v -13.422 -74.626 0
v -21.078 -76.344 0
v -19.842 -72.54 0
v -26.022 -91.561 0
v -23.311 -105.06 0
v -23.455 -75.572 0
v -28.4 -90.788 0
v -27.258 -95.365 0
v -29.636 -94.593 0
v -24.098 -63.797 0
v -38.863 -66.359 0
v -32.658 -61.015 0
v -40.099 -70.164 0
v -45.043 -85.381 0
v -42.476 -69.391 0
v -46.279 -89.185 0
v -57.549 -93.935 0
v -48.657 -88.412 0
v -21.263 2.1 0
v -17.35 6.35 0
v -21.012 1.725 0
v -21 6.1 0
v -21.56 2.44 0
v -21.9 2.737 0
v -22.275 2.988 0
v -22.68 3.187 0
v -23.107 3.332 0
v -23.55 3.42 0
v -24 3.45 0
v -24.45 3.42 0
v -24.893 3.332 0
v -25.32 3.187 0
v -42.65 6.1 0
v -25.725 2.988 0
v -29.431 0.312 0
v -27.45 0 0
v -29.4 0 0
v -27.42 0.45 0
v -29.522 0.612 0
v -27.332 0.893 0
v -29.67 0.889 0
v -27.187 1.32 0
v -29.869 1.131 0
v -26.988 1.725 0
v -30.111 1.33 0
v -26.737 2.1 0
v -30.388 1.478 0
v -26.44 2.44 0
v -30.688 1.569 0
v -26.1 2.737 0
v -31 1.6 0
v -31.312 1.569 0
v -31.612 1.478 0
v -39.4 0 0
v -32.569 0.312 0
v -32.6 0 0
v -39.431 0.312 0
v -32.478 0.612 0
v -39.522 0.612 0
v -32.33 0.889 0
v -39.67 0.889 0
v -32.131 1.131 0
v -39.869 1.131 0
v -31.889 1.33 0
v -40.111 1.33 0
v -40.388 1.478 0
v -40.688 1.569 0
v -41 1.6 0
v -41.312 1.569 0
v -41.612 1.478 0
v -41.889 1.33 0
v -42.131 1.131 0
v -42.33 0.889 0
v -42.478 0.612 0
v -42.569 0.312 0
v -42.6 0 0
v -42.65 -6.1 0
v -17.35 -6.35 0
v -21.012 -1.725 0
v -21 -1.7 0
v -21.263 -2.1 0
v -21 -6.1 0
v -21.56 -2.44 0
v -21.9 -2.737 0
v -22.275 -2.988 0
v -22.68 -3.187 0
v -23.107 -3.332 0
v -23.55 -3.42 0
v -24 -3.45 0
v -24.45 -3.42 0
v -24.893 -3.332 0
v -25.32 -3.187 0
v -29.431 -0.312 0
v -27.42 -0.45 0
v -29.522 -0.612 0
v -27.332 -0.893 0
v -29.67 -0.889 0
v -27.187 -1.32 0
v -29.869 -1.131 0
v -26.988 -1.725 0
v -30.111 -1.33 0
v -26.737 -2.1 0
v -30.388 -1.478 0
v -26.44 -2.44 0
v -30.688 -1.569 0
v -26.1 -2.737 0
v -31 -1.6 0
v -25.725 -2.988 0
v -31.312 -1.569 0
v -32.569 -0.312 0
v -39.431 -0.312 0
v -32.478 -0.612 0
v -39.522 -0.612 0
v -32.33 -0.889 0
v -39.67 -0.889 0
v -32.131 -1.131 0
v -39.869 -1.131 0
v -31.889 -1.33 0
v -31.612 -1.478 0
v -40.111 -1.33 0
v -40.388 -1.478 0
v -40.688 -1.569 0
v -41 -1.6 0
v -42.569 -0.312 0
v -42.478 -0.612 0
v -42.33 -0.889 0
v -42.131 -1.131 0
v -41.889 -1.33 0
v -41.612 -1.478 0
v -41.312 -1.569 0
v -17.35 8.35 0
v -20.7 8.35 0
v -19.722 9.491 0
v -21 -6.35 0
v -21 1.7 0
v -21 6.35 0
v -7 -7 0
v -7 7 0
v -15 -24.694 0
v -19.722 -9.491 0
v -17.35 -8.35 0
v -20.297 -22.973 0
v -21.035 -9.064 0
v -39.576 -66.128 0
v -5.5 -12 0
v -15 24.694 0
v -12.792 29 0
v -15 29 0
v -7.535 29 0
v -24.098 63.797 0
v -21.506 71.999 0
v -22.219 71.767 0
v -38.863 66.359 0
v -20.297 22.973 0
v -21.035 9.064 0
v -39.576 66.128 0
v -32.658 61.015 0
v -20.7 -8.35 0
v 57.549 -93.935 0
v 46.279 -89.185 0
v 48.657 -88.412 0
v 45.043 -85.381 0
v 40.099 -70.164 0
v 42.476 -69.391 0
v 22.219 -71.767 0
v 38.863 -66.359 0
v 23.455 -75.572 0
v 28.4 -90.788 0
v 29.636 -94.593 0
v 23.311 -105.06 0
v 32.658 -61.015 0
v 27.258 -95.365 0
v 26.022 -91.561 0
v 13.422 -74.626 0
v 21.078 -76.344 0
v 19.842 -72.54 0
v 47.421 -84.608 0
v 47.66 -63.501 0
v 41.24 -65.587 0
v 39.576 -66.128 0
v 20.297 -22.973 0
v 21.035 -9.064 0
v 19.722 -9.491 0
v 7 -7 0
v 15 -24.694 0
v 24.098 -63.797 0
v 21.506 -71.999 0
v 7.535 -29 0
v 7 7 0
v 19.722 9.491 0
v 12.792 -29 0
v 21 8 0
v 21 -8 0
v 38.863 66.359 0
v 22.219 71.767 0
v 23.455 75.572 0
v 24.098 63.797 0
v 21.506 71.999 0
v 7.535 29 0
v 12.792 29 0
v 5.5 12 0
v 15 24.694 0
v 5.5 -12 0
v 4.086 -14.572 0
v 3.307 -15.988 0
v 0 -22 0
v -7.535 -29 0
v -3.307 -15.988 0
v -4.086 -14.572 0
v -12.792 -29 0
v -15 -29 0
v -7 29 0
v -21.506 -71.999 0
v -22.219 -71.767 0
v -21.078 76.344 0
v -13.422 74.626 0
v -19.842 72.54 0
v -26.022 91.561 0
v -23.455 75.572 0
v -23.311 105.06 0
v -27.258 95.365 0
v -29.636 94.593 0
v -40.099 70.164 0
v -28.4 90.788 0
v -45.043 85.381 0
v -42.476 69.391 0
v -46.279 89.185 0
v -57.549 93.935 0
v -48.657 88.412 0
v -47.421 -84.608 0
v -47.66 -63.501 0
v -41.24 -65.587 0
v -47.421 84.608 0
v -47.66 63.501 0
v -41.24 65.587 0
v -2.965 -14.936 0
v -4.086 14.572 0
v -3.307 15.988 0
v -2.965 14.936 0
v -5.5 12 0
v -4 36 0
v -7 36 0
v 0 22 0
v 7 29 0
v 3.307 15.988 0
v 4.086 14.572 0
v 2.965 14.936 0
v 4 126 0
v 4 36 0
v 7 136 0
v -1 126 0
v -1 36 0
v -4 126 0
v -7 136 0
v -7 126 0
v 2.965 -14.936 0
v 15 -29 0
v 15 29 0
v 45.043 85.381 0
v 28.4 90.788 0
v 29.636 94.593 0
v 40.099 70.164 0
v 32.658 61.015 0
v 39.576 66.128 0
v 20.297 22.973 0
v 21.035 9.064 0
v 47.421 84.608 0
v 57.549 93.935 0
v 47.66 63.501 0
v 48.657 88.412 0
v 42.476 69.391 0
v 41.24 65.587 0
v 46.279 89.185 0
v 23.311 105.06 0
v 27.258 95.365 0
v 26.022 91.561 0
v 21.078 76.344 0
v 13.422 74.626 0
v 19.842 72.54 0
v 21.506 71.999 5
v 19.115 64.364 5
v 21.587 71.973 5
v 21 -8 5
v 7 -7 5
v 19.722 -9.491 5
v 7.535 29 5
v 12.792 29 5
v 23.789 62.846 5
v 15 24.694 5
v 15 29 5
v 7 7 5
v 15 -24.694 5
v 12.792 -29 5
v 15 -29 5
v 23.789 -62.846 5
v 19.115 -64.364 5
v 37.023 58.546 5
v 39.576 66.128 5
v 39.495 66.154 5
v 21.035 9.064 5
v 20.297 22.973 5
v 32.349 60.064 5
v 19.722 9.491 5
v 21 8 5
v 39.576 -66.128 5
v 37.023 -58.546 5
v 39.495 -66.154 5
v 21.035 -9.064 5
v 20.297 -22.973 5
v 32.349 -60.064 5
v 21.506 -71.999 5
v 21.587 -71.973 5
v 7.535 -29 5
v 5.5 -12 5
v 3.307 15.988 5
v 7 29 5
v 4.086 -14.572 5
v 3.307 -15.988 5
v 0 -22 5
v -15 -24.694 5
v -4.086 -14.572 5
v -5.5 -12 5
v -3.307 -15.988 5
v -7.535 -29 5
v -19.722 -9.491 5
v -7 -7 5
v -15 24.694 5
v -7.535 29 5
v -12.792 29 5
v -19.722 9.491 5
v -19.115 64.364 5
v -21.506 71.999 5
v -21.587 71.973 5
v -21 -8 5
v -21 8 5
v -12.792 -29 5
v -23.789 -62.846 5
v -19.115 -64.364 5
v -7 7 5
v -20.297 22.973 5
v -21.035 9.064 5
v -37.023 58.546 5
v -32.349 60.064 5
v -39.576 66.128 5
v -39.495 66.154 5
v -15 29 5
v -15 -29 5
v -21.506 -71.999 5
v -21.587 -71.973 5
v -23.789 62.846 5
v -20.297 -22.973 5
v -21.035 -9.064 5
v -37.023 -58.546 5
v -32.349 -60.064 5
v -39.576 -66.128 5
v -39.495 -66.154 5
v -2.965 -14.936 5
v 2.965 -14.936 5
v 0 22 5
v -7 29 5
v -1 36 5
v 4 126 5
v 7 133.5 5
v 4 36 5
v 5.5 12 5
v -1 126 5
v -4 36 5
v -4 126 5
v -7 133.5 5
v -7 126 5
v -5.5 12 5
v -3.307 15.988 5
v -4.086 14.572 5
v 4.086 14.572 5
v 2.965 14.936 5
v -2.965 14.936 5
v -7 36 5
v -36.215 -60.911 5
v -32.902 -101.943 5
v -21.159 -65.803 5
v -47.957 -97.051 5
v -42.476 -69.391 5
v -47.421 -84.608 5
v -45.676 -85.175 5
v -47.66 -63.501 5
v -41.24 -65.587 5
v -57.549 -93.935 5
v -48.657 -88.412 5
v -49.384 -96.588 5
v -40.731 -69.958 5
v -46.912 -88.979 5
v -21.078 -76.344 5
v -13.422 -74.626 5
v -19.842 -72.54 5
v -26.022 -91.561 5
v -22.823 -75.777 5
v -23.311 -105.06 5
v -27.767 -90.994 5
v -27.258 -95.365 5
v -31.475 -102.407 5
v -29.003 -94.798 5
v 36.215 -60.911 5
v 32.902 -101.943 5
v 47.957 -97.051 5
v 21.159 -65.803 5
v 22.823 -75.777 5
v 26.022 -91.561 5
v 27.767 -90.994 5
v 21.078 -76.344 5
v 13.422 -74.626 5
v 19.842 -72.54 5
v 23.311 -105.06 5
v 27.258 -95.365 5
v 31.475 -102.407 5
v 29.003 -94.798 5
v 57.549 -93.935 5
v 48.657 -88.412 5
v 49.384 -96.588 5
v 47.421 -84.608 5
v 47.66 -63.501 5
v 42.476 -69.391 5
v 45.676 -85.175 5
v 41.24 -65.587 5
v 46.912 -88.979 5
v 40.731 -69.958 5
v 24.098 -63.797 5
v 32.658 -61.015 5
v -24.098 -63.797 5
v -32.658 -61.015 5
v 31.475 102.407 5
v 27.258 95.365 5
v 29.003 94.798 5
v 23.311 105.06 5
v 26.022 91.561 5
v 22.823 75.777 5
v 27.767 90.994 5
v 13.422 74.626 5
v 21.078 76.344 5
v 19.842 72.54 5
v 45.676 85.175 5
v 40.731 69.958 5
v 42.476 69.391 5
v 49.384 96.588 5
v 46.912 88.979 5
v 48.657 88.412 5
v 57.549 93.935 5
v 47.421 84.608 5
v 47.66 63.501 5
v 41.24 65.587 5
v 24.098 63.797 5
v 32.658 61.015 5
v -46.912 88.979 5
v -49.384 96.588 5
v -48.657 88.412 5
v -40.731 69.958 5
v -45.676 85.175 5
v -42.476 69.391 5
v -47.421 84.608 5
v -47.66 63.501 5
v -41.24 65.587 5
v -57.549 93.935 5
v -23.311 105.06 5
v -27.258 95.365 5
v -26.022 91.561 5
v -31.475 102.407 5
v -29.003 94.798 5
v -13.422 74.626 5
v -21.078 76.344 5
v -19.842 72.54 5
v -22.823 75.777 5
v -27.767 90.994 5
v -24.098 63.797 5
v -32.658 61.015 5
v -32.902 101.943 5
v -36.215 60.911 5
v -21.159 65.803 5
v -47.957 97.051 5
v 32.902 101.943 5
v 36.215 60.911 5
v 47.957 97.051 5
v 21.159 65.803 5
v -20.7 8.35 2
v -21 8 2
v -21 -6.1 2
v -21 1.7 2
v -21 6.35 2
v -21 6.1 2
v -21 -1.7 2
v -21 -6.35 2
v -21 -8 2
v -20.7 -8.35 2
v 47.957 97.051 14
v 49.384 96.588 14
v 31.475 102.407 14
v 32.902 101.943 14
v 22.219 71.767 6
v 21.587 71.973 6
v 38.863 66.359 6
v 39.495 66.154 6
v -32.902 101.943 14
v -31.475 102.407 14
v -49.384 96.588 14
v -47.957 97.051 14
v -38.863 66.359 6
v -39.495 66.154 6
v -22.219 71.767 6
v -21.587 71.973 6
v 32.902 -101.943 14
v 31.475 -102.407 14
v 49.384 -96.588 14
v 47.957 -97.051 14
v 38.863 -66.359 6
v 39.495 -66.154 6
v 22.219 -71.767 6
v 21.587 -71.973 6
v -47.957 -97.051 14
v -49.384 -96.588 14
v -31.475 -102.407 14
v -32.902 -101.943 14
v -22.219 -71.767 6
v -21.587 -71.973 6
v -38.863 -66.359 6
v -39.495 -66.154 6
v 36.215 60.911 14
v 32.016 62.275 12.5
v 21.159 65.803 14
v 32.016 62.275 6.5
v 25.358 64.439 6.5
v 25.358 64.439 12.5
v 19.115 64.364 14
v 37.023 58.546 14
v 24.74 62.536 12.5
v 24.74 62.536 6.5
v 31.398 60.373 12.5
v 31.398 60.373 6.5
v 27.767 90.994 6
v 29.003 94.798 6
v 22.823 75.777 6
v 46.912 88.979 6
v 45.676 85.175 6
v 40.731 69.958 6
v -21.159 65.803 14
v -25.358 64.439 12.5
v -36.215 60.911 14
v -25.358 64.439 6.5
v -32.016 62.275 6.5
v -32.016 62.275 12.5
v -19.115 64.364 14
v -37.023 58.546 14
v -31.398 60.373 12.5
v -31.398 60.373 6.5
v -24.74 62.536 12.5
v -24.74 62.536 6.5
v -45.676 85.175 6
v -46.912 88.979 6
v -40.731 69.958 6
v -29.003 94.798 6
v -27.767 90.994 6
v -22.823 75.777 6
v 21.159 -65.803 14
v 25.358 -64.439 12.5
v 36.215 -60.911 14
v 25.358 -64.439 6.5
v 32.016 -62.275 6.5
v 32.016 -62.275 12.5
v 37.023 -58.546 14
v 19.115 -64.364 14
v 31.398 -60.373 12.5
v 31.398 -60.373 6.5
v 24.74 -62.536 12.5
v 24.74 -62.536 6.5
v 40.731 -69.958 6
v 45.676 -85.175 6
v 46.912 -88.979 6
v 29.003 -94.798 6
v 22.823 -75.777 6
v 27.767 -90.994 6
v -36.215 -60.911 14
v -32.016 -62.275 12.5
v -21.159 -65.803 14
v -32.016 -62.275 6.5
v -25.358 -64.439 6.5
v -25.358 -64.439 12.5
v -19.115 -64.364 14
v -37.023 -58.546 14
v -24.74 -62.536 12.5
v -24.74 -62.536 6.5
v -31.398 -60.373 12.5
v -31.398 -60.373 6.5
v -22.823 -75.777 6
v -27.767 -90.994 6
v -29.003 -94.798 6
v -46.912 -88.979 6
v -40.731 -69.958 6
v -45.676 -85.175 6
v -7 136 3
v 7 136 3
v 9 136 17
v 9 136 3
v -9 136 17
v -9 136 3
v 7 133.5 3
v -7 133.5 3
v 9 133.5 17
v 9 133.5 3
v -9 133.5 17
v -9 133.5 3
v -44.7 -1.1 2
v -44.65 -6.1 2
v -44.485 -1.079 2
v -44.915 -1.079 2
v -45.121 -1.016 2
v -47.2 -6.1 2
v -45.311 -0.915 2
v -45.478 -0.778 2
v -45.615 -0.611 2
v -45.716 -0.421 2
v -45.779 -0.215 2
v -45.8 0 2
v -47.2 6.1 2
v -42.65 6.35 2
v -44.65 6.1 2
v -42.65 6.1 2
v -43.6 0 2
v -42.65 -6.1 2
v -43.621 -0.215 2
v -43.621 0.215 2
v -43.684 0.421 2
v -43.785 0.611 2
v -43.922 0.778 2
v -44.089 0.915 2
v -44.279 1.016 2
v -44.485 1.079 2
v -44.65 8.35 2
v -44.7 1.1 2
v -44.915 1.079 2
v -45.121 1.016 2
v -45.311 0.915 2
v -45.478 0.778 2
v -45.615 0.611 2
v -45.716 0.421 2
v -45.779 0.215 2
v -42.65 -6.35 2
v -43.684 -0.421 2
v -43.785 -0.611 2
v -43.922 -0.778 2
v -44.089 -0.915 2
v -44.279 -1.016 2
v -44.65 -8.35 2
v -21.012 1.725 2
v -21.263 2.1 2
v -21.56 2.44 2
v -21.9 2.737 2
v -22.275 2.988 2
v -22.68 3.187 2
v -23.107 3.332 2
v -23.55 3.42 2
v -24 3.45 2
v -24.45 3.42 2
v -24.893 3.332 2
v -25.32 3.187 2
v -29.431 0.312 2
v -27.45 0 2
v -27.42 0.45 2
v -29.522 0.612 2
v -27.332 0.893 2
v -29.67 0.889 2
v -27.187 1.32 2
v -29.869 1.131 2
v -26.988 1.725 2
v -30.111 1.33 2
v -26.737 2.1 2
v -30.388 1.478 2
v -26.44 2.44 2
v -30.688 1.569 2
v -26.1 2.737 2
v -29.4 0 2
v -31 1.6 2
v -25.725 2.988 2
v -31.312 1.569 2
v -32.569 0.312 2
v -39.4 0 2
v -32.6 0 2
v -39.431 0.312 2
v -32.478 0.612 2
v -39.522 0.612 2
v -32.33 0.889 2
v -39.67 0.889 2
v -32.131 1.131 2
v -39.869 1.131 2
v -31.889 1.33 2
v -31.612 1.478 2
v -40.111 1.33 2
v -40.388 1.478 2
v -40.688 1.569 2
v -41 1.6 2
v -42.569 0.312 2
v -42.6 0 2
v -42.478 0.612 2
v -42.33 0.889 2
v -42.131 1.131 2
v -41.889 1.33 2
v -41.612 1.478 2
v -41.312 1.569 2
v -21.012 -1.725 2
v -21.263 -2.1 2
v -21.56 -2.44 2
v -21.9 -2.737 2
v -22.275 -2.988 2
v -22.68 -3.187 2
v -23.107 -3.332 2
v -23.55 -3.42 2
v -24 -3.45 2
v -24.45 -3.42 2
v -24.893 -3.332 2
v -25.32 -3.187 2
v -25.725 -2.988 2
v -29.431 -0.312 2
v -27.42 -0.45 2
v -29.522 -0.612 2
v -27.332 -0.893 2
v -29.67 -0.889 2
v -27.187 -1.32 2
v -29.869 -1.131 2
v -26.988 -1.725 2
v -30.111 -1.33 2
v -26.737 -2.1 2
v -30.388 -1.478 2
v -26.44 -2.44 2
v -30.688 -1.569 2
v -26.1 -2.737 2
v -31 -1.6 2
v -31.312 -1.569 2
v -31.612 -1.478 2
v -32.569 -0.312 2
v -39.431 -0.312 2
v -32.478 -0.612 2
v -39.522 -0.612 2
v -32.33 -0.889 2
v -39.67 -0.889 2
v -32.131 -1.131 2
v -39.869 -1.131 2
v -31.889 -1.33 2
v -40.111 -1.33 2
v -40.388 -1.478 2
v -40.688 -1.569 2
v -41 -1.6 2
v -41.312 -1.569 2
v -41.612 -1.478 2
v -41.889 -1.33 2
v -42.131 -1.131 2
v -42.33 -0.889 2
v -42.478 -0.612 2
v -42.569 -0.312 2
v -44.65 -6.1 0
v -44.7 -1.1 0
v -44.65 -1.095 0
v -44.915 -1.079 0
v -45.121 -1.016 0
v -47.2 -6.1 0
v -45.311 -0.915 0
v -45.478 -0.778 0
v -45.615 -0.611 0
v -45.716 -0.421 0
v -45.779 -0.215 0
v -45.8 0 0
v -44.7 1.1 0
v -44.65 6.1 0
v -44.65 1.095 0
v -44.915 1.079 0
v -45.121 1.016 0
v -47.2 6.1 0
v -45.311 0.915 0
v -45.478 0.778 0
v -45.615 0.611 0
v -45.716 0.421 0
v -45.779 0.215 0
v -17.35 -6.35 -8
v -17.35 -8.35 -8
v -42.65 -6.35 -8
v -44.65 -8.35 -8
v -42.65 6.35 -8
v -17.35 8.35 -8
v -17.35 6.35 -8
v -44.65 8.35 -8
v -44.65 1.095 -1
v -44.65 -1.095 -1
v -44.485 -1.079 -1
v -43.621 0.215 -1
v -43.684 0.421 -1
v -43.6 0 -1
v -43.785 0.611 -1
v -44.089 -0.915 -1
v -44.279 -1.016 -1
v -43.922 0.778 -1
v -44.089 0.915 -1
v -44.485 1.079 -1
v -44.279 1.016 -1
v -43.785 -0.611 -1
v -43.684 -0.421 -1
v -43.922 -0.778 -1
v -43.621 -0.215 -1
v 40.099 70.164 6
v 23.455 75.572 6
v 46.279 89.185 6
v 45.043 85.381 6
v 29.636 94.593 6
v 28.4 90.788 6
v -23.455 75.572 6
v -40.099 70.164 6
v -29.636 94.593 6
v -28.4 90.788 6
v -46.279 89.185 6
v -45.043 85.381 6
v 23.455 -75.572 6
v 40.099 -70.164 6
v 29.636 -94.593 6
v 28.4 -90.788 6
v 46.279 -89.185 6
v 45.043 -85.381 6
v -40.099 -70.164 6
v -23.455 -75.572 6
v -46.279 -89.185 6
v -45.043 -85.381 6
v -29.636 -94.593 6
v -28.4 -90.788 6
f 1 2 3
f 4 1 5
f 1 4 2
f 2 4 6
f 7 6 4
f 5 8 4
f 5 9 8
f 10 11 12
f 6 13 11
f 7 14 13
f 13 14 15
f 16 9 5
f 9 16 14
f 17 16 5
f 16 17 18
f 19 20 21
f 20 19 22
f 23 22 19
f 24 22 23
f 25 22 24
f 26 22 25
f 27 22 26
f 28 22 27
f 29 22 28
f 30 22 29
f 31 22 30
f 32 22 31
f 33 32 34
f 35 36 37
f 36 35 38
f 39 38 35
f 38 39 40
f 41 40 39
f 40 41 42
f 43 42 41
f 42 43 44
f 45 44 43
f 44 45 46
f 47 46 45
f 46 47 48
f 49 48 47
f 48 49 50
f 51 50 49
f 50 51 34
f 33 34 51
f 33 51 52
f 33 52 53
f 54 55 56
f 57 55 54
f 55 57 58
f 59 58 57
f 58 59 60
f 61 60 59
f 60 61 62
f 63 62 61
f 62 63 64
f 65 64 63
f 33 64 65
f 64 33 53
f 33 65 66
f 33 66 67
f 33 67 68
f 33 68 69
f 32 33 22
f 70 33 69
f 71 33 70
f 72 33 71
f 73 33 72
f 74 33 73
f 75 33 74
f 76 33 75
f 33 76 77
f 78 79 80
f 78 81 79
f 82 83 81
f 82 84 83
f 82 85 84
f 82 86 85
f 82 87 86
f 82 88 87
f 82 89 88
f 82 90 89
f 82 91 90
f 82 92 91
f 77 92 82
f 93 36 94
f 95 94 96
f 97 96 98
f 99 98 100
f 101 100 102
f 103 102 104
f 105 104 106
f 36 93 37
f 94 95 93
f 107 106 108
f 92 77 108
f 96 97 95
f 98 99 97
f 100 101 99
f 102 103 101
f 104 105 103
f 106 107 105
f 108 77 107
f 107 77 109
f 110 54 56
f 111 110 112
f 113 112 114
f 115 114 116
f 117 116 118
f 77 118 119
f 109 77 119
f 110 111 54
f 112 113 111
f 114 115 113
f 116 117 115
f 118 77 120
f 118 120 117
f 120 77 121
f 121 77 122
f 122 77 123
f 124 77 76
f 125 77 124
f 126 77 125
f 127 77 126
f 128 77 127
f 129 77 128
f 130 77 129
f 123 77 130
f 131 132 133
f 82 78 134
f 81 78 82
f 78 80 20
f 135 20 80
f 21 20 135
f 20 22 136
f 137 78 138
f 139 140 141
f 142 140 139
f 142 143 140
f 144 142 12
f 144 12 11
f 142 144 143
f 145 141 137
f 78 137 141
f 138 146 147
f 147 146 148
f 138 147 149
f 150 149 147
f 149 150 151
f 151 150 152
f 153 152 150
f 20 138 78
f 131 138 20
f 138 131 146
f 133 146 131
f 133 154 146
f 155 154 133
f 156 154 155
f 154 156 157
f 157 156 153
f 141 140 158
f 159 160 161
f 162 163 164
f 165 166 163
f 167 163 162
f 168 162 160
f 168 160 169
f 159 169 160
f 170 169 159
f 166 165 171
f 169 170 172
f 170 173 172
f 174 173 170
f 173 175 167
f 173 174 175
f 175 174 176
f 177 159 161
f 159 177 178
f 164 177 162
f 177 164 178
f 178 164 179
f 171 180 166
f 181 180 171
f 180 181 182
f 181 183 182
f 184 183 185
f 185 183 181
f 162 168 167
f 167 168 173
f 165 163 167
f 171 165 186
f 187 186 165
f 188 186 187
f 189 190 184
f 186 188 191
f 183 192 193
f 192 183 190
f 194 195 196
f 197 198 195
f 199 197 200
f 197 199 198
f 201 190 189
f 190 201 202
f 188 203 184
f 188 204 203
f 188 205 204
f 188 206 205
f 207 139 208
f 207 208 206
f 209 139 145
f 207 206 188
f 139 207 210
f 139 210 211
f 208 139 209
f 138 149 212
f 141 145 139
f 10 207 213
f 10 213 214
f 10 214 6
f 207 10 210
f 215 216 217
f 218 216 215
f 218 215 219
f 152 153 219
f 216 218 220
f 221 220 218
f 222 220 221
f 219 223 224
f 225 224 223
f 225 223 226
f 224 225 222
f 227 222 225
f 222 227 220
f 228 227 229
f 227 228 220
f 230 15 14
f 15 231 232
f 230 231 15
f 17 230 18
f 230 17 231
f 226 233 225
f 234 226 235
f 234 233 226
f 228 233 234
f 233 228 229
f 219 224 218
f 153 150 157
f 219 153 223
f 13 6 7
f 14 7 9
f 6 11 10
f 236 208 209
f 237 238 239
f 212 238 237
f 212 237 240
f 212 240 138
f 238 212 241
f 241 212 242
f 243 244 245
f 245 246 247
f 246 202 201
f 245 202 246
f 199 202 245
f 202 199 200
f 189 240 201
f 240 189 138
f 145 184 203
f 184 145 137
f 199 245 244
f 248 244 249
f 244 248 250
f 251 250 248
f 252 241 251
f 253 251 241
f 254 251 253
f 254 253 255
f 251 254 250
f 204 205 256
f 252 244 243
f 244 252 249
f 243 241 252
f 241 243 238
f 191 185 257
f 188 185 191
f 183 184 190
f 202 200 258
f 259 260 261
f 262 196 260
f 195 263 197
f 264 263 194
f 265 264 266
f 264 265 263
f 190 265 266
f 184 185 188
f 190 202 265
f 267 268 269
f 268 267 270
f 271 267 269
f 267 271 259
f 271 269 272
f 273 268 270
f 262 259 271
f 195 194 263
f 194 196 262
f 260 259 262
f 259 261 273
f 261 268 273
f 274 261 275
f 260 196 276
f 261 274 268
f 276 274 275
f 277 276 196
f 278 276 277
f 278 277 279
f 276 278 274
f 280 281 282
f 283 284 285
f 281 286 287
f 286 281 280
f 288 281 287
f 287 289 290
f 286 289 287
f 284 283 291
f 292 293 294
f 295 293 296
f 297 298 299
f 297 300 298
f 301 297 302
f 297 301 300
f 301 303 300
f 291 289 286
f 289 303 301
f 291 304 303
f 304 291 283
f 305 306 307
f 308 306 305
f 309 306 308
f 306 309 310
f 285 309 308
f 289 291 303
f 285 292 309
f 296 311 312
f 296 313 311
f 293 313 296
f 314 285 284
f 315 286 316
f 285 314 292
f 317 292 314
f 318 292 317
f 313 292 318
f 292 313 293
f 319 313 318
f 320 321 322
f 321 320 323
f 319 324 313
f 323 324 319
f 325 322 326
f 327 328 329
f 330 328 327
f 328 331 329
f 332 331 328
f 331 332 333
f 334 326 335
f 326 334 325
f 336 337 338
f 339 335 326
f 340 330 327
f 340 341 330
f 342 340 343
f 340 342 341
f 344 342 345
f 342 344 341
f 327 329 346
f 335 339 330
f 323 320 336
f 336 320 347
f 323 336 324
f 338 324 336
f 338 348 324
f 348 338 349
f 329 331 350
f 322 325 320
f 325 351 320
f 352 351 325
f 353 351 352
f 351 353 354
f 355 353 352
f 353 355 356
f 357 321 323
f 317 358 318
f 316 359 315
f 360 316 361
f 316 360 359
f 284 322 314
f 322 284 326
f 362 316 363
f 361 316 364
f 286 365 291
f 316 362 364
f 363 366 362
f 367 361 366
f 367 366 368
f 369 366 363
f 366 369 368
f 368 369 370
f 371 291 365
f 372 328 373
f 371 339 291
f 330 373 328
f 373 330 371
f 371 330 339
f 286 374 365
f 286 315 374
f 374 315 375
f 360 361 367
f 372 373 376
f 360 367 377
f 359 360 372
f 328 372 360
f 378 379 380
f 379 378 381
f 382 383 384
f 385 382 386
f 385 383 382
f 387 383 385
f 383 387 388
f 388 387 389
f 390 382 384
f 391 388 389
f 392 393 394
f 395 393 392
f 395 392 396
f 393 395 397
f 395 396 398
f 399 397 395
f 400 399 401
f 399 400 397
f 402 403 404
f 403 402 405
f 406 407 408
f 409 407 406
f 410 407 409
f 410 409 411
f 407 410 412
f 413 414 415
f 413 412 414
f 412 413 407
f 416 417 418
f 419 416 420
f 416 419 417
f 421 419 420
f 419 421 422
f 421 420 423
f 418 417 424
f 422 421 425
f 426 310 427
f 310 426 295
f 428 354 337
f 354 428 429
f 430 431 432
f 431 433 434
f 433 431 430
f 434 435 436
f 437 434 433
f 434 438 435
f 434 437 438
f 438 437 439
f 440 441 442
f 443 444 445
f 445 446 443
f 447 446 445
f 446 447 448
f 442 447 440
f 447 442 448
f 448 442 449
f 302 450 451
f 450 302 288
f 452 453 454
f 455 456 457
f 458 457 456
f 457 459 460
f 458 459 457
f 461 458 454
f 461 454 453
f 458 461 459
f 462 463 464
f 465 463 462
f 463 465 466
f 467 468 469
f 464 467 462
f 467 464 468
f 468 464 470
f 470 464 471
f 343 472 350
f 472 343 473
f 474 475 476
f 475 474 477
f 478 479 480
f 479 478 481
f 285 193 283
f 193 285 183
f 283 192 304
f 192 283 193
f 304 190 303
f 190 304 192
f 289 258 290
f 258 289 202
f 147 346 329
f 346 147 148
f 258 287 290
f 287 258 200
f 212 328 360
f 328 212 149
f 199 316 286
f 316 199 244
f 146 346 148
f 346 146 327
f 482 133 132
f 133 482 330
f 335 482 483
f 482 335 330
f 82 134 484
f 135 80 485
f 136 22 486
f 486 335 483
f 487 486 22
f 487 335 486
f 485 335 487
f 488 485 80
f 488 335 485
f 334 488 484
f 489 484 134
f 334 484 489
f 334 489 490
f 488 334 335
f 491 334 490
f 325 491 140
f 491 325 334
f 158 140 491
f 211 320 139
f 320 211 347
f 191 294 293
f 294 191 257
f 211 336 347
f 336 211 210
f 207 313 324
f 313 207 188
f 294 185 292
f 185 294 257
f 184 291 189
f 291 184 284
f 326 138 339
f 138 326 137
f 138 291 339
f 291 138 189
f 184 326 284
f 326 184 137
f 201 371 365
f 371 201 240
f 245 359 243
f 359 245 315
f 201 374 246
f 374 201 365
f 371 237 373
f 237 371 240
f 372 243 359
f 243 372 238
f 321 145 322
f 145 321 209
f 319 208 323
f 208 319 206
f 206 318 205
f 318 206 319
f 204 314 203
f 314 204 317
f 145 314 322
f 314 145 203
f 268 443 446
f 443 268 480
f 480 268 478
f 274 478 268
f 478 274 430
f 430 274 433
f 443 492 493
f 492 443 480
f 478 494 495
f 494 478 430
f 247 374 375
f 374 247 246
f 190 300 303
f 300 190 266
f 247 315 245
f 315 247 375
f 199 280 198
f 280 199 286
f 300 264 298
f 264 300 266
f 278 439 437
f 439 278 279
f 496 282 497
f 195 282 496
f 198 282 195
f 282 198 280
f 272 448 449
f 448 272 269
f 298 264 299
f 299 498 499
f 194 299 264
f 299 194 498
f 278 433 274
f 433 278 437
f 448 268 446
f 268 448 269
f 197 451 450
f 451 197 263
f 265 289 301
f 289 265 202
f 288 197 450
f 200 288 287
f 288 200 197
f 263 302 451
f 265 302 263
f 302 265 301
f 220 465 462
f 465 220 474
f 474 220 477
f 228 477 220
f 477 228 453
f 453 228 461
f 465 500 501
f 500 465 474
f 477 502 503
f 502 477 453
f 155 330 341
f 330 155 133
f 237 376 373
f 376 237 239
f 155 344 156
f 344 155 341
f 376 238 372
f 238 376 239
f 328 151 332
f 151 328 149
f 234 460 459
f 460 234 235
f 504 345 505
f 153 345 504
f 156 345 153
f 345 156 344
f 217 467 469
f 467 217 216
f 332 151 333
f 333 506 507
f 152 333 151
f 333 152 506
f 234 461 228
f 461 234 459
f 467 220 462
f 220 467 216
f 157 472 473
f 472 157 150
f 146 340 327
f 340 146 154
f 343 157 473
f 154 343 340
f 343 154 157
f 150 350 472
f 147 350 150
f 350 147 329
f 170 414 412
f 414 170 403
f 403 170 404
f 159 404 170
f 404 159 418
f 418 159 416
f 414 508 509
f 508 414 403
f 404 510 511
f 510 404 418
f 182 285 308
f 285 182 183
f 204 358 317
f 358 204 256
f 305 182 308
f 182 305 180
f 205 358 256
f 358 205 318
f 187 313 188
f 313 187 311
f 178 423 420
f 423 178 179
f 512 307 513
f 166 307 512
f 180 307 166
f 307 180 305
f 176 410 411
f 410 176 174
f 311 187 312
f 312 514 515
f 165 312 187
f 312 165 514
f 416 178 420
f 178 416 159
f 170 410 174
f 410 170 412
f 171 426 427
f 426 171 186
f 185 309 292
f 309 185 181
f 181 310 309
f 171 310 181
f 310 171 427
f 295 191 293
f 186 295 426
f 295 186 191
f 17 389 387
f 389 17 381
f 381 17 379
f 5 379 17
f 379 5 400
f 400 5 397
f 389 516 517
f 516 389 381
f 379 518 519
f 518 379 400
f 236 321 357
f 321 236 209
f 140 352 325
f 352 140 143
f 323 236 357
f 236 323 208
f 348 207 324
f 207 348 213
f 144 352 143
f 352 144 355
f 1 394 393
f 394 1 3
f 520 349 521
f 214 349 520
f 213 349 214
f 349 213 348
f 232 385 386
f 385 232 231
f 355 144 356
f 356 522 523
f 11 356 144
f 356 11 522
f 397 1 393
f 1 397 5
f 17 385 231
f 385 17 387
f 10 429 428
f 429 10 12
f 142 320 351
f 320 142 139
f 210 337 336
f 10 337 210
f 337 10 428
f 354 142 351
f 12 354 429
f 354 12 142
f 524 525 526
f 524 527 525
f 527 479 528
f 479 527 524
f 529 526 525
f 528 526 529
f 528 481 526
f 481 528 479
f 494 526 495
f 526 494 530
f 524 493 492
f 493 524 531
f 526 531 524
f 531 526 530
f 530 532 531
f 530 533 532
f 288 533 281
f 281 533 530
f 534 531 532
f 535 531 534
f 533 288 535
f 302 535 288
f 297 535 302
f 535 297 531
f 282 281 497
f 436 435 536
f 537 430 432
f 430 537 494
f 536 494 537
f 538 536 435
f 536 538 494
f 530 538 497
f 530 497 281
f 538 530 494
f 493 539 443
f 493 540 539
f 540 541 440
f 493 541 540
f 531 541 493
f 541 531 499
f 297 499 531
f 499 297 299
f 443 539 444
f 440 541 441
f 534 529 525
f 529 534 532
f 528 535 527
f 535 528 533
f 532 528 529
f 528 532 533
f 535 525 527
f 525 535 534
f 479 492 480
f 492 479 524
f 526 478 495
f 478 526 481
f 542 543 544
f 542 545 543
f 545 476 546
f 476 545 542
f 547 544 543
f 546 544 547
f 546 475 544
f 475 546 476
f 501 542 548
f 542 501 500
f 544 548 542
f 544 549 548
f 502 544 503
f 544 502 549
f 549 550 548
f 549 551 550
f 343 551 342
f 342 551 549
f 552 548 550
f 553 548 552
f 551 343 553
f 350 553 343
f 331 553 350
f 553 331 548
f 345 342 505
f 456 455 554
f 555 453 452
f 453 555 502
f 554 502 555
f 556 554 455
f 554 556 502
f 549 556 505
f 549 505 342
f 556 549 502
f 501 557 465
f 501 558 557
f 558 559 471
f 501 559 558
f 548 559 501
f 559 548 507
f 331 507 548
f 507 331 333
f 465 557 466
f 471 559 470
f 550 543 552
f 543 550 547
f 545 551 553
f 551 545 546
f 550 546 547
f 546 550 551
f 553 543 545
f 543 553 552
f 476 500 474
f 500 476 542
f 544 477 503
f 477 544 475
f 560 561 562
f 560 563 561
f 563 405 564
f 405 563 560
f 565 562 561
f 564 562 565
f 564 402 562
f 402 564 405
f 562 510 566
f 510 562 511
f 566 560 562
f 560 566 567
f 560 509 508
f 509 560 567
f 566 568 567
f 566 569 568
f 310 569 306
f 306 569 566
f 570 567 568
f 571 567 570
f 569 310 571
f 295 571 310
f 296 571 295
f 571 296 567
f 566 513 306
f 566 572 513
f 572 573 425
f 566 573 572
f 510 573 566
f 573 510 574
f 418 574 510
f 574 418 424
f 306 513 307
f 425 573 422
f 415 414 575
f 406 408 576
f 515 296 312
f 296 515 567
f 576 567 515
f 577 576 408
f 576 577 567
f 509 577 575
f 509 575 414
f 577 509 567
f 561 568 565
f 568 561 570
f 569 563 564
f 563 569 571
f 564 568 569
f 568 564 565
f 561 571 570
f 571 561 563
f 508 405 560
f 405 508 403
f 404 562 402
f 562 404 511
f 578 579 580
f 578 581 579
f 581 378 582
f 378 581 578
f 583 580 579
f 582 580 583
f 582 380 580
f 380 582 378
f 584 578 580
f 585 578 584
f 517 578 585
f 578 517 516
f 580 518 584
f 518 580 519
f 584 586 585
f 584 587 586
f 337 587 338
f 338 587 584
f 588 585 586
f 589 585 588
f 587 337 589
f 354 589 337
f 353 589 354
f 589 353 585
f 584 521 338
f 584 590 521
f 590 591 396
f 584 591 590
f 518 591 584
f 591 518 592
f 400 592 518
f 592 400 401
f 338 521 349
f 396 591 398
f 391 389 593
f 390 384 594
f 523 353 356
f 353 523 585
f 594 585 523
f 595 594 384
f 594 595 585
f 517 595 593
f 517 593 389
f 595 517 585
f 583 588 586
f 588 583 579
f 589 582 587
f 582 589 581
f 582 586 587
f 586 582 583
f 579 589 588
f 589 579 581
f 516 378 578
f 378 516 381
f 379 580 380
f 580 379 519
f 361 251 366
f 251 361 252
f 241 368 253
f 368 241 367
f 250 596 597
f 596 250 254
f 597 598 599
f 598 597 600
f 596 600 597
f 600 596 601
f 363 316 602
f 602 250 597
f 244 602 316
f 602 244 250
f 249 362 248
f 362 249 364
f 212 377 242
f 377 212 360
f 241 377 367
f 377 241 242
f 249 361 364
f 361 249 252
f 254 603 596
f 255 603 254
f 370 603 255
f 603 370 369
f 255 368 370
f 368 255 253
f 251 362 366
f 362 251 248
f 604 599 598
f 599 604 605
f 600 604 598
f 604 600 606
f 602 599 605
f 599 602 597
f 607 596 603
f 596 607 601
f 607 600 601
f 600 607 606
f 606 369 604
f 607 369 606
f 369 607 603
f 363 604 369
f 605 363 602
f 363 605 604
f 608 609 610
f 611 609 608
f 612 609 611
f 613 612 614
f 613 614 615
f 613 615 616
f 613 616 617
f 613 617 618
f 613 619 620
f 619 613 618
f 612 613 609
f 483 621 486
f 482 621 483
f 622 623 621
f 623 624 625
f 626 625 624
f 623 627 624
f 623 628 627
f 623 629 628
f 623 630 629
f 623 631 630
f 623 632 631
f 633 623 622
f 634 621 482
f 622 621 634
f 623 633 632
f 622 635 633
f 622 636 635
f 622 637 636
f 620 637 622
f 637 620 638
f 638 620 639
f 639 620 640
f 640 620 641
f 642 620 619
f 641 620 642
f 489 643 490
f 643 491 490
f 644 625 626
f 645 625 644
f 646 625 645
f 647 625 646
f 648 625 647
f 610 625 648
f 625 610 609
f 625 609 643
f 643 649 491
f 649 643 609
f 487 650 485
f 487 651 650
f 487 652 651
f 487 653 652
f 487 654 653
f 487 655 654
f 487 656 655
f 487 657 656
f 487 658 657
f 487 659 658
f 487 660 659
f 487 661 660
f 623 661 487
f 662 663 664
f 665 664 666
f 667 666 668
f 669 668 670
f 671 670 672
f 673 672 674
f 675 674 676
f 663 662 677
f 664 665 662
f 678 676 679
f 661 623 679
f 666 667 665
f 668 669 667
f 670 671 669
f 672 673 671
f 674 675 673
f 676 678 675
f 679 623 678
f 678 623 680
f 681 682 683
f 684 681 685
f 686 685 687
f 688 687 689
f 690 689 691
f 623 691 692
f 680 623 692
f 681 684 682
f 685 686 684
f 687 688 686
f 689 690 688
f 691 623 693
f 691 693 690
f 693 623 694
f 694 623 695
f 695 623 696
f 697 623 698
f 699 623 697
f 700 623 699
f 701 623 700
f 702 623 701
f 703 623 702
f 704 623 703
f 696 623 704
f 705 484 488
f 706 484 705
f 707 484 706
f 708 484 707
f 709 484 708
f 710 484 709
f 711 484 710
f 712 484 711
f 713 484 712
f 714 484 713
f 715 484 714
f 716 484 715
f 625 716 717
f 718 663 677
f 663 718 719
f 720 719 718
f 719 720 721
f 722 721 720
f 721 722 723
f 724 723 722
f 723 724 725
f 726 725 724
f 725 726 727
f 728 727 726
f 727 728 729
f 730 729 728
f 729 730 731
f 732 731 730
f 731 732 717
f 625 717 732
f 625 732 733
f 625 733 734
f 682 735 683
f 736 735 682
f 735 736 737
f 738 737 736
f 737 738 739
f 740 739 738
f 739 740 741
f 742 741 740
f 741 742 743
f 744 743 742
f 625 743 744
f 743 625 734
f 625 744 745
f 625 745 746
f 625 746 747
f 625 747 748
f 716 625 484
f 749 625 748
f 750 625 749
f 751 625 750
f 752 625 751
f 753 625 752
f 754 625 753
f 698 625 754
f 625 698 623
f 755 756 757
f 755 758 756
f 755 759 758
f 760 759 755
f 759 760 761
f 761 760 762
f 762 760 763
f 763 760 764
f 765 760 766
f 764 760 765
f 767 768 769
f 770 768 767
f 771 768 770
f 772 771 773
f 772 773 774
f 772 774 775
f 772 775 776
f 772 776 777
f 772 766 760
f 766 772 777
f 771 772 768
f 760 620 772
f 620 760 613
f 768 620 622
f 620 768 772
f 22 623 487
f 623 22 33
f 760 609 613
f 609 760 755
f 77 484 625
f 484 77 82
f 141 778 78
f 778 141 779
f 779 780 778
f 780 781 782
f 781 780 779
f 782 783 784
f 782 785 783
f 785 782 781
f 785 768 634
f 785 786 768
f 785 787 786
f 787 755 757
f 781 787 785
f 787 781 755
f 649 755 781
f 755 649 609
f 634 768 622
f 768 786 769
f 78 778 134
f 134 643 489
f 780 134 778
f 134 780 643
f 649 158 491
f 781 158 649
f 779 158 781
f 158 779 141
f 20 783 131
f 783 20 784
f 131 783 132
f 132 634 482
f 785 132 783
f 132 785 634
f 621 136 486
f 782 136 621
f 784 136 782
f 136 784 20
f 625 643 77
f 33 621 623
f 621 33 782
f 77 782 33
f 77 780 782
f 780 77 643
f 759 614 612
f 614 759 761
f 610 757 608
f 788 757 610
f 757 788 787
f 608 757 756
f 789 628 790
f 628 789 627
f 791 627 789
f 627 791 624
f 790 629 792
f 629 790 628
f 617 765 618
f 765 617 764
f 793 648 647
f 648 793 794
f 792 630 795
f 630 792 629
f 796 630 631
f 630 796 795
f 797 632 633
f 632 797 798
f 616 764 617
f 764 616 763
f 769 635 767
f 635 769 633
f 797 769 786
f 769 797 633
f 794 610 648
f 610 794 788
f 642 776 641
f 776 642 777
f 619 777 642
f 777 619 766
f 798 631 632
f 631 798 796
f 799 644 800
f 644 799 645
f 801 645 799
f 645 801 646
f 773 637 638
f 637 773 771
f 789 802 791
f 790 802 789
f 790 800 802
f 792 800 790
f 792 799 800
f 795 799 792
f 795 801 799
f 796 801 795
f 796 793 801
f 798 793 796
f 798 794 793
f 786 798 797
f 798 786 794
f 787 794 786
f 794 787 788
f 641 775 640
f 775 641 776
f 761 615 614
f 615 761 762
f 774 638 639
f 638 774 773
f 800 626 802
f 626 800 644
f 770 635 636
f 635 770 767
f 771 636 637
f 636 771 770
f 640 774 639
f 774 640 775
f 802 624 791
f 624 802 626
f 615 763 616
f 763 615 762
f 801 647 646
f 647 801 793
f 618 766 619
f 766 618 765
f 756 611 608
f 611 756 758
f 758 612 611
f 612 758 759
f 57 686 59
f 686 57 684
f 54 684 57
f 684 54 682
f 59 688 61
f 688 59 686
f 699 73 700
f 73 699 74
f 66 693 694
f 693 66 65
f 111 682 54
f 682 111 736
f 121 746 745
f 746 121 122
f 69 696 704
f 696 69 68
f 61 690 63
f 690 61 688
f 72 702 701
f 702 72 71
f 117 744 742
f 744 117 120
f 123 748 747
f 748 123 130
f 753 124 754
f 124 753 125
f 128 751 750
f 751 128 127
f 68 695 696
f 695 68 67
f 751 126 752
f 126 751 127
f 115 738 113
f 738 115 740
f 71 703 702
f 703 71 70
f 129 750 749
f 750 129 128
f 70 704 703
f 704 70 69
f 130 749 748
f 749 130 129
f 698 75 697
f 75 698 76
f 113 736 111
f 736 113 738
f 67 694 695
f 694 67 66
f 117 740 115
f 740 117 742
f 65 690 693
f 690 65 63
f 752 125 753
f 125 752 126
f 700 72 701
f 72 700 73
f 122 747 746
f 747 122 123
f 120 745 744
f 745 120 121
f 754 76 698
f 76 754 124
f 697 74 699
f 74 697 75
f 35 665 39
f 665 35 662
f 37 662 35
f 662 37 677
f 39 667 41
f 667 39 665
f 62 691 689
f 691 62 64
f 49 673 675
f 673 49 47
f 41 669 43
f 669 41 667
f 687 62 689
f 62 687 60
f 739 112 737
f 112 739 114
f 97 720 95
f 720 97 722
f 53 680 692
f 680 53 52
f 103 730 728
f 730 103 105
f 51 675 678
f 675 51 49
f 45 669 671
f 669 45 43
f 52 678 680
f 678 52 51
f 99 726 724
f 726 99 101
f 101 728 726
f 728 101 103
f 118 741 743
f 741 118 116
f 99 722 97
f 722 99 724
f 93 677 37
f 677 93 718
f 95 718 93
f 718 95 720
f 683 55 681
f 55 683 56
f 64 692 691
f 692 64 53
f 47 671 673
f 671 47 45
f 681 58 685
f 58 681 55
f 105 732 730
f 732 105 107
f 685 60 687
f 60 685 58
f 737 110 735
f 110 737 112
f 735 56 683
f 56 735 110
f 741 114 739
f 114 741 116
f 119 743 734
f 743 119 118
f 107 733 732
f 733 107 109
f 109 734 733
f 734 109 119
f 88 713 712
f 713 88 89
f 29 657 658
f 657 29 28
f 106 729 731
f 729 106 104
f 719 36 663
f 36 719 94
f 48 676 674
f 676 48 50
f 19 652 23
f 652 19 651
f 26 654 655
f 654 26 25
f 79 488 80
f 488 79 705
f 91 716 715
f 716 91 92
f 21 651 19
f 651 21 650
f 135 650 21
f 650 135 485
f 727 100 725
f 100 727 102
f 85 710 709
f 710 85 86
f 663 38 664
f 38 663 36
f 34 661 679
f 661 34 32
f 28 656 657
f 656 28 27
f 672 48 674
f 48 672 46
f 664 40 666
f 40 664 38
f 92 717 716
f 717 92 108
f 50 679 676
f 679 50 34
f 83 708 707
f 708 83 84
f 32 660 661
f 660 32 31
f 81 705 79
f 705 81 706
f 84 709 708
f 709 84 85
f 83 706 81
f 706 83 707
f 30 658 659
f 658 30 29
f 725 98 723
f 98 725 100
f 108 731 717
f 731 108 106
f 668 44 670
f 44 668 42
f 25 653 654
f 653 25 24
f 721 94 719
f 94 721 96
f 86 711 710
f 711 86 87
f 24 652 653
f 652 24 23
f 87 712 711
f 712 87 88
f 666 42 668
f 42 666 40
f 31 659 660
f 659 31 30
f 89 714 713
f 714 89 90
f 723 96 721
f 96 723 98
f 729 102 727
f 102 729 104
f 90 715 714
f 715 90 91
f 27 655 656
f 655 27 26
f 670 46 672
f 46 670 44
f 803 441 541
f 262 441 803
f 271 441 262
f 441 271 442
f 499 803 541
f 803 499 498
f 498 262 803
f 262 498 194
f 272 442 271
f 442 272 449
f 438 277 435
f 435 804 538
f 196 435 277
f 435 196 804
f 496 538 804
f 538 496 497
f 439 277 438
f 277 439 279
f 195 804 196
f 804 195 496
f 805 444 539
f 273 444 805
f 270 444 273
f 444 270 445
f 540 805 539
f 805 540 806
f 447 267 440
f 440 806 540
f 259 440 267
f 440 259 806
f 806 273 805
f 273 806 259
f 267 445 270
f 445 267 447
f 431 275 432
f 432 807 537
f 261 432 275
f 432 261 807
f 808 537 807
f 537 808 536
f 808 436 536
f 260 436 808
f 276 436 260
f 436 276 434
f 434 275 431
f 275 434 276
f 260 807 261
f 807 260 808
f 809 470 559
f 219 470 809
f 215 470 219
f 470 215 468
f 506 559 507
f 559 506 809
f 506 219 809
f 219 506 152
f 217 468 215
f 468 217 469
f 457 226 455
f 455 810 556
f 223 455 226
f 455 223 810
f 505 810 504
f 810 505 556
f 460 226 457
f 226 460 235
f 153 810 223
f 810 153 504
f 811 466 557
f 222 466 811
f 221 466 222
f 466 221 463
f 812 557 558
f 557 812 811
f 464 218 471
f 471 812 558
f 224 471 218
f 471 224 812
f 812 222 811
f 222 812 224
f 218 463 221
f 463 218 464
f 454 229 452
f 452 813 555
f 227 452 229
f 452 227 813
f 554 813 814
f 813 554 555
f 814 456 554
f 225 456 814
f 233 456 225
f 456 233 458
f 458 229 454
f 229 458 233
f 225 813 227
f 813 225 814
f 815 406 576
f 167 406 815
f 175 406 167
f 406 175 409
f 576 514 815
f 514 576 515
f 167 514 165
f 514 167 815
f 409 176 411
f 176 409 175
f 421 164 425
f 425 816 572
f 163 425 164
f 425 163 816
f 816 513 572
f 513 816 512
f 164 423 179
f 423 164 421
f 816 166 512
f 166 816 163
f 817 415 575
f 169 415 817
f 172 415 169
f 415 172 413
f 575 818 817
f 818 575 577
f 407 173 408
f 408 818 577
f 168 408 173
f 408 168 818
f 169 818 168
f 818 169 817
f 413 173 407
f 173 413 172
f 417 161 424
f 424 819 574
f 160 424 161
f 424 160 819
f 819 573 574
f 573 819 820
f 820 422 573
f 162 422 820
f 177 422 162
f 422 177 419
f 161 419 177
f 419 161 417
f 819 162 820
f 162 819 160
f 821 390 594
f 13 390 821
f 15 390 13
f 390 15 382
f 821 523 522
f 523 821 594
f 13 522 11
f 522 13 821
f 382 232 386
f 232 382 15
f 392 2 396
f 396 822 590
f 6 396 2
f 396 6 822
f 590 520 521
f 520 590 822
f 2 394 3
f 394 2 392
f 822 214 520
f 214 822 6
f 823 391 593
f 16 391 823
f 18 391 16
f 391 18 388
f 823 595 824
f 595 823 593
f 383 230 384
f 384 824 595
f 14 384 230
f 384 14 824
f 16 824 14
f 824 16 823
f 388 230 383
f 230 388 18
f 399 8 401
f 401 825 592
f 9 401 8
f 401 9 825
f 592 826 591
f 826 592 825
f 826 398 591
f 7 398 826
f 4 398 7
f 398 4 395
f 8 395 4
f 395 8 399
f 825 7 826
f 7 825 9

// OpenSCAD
// Project Grace V4 - adjustable skeleton with MG90S cradle and ToF sensor boom.
// Dimensions are in millimetres. Earlier revisions remain preserved.

// Set to "motor_reference" or "servo_reference" to inspect component envelopes.
view_mode = "skeleton";

// IMechE External Pipe Climber brief: commercial 22 mm copper pipe.
// A 2 mm undersize wheel gap preloads the tyres against the pipe for grip.
pipe_outer_diameter = 22;
wheel_gap_undersize = 2;
target_wheel_gap = pipe_outer_diameter - wheel_gap_undersize;

frame_thickness = 5;

// Central body.
center_width = 30;
center_height = 58;
center_opening_size = 14;
triangle_opening_width = 11;
triangle_opening_height = 10;

// Four identical arms and their solid motor-mount pads.
// Increase arm_extension to gain climbing stroke without changing the mount layout.
base_arm_length = 92;
arm_extension = 0;
arm_length = base_arm_length + arm_extension;
arm_width = 19;
arm_slot_width = 9;
arm_slot_start = 13;
arm_slot_end_clearance = 7;
end_pad_length = 32;
end_pad_width = 36;
arm_angle = 72;

// Forward ToF boom. Angle 0 points between the two upper arms along the pipe.
tof_boom_length = 110;
tof_boom_width = 14;
tof_boom_rail_width = 3;
tof_boom_brace_length = 10;
tof_boom_overlap = 3;
tof_boom_angle = 0;
tof_face_width = 18;
tof_face_height = 12;
tof_face_thickness = 2.5;

// Measured N20-style micro metal gearmotor envelope from the supplied photos.
// The total length includes the output shaft; the individual can and gearbox lengths are estimates.
motor_overall_length = 46.05;
motor_width = 15.23;
motor_thickness = 11.82;
motor_can_length = 22;
gearbox_length = 16;
output_shaft_length = motor_overall_length - motor_can_length - gearbox_length;
output_shaft_diameter = 3;

// Integrated holder dimensions. The motor sits directly on the frame surface.
motor_fit_clearance = 0.6;
holder_wall_thickness = 1.5;
holder_wall_height = 9;
holder_back_stop_thickness = 2;
holder_length = motor_can_length + gearbox_length + 2;
wire_exit_width = 7;
wire_exit_height = 6;
cable_tie_slot_width = 2.5;
cable_tie_slot_length = 4;
cable_tie_slot_positions = [10, 30];
cable_tie_slot_y = 10;

// MG90S micro-servo dimensions. Verify the tab-hole spacing on the supplied servo.
servo_body_length = 22.8;
servo_body_width = 12.2;
servo_body_height = 28.5;
servo_fit_clearance = 0.5;
servo_ear_length = 32.4;
servo_ear_width = 12.2;
servo_ear_thickness = 2.5;
servo_ear_height_from_spline = 19;
servo_mount_hole_diameter = 2.2;
servo_mount_hole_spacing = 27.4;
servo_cradle_wall_thickness = 2;
servo_cradle_wall_height = 10;
servo_cradle_floor_thickness = 2;
servo_spline_diameter = 4.9;
servo_spline_projection = 4;
servo_spline_x_offset = 7;
servo_cradle_center_x = -31;
servo_cradle_mount_z = servo_cradle_floor_thickness;
servo_inner_bracket_hole_diameter = 3.2;
servo_inner_bracket_hole_positions = [-10, 0, 10];

module arm_with_pad(root_x, root_y, angle) {
    arm_slot_length = arm_length - end_pad_length - arm_slot_start - arm_slot_end_clearance;

    translate([root_x, root_y, 0])
        rotate([0, 0, angle])
            difference() {
                union() {
                    translate([0, -arm_width / 2, 0])
                        cube([arm_length, arm_width, frame_thickness]);
                    translate([arm_length - end_pad_length, -end_pad_width / 2, 0])
                        cube([end_pad_length, end_pad_width, frame_thickness]);
                }

                // Long lightening slot, matching the reference skeleton.
                translate([arm_slot_start, -arm_slot_width / 2, -1])
                    cube([arm_slot_length, arm_slot_width, frame_thickness + 2]);
            }
}

module triangular_opening(y_position, points_up) {
    translate([0, y_position, -1])
        linear_extrude(height = frame_thickness + 2)
            if (points_up)
                polygon(points = [
                    [-triangle_opening_width / 2, -triangle_opening_height / 2],
                    [triangle_opening_width / 2, -triangle_opening_height / 2],
                    [0, triangle_opening_height / 2]
                ]);
            else
                polygon(points = [
                    [-triangle_opening_width / 2, triangle_opening_height / 2],
                    [triangle_opening_width / 2, triangle_opening_height / 2],
                    [0, -triangle_opening_height / 2]
                ]);
}

module center_body() {
    difference() {
        linear_extrude(height = frame_thickness)
            polygon(points = [
                [-center_width / 2, -center_height / 2],
                [center_width / 2, -center_height / 2],
                [center_width / 2, -center_height / 2 + 14],
                [center_width / 2 + 6, -8],
                [center_width / 2 + 6, 8],
                [center_width / 2, center_height / 2 - 14],
                [center_width / 2, center_height / 2],
                [-center_width / 2, center_height / 2],
                [-center_width / 2, center_height / 2 - 14],
                [-center_width / 2 - 6, 8],
                [-center_width / 2 - 6, -8],
                [-center_width / 2, -center_height / 2 + 14]
            ]);

        translate([-center_opening_size / 2, -center_opening_size / 2, -1])
            cube([center_opening_size, center_opening_size, frame_thickness + 2]);
        triangular_opening(center_opening_size / 2 + triangle_opening_height, true);
        triangular_opening(-center_opening_size / 2 - triangle_opening_height, false);
    }
}

module tof_sensor_boom() {
    boom_start_y = center_height / 2 - tof_boom_overlap;
    boom_end_y = boom_start_y + tof_boom_length;
    face_z = frame_thickness - 2;

    rotate([0, 0, tof_boom_angle])
        union() {
            // Two rails provide the reach while removing most of the boom weight.
            for (side = [-1, 1])
                translate([
                    side * (tof_boom_width / 2 - tof_boom_rail_width),
                    boom_start_y,
                    0
                ])
                    cube([tof_boom_rail_width, tof_boom_length, frame_thickness]);

            // Root and tip braces prevent the rails twisting under acceleration.
            translate([-tof_boom_width / 2, boom_start_y, 0])
                cube([tof_boom_width, tof_boom_brace_length, frame_thickness]);
            translate([-tof_boom_width / 2, boom_end_y - tof_boom_brace_length, 0])
                cube([tof_boom_width, tof_boom_brace_length, frame_thickness]);

            // Compact flat pad for gluing the small ToF sensor board in place.
            translate([-tof_face_width / 2, boom_end_y - tof_face_thickness, face_z])
                cube([tof_face_width, tof_face_thickness, tof_face_height + 2]);
        }
}

module motor_holder() {
    holder_outer_width = motor_width + motor_fit_clearance + 2 * holder_wall_thickness;

    union() {
        // Rear stop prevents the motor moving towards the centre of the frame.
        difference() {
            translate([0, -holder_outer_width / 2, 0])
                cube([holder_back_stop_thickness, holder_outer_width, holder_wall_height]);
            translate([
                -1,
                -wire_exit_width / 2,
                (holder_wall_height - wire_exit_height) / 2
            ])
                cube([holder_back_stop_thickness + 2, wire_exit_width, wire_exit_height]);
        }

        // Low rails locate the compound motor without interfering with its gearbox or shaft.
        translate([0, -holder_outer_width / 2, 0])
            cube([holder_length, holder_wall_thickness, holder_wall_height]);
        translate([0, holder_outer_width / 2 - holder_wall_thickness, 0])
            cube([holder_length, holder_wall_thickness, holder_wall_height]);
    }
}

module motor_holder_tie_slots() {
    // Two tie stations prevent the motor rotating in its holder under drive torque.
    for (tie_x = cable_tie_slot_positions)
        for (side = [-1, 1])
            translate([
                tie_x - cable_tie_slot_length / 2,
                side * cable_tie_slot_y - cable_tie_slot_width / 2,
                -1
            ])
                cube([cable_tie_slot_length, cable_tie_slot_width, frame_thickness + 2]);
}

module holder_on_arm(root_x, root_y, angle) {
    translate([root_x, root_y, frame_thickness])
        rotate([0, 0, angle])
            translate([arm_length - holder_length, 0, 0])
                motor_holder();
}

module holder_slots_on_arm(root_x, root_y, angle) {
    translate([root_x, root_y, 0])
        rotate([0, 0, angle])
            translate([arm_length - holder_length, 0, 0])
                motor_holder_tie_slots();
}

module servo_cradle() {
    cradle_inner_length = servo_body_length + servo_fit_clearance;
    cradle_inner_width = servo_body_width + servo_fit_clearance;
    cradle_outer_length = cradle_inner_length + 2 * servo_cradle_wall_thickness;
    cradle_outer_width = cradle_inner_width + 2 * servo_cradle_wall_thickness;
    ear_hole_x = servo_mount_hole_spacing / 2;

    // Side-mounted under-frame tray: the servo spline and ChainHookHorn face downward.
    difference() {
        union() {
            // The wide plate carries the servo's two mounting ears.
            translate([-servo_ear_length / 2, -servo_ear_width / 2, -servo_cradle_floor_thickness])
                cube([servo_ear_length, servo_ear_width, servo_cradle_floor_thickness]);

            // Low side rails locate the body in the cradle without covering its output end.
            translate([
                -cradle_outer_length / 2,
                -cradle_outer_width / 2,
                -servo_cradle_wall_height
            ])
                cube([
                    cradle_outer_length,
                    servo_cradle_wall_thickness,
                    servo_cradle_wall_height
                ]);
            translate([
                -cradle_outer_length / 2,
                cradle_outer_width / 2 - servo_cradle_wall_thickness,
                -servo_cradle_wall_height
            ])
                cube([
                    cradle_outer_length,
                    servo_cradle_wall_thickness,
                    servo_cradle_wall_height
                ]);

            // Outer end stop keeps the servo located against drive vibration.
            translate([
                -cradle_outer_length / 2,
                -cradle_outer_width / 2,
                -servo_cradle_wall_height
            ])
                cube([
                    servo_cradle_wall_thickness,
                    cradle_outer_width,
                    servo_cradle_wall_height
                ]);
        }

        // Opening under the spline lets the servo horn and chain hook run freely.
        translate([servo_spline_x_offset, 0, -servo_cradle_floor_thickness - 1])
            cylinder(d = servo_spline_diameter + 2, h = servo_cradle_floor_thickness + 2, $fn = 48);

        // M2 through-holes align with the MG90S mounting ears.
        for (x_position = [-ear_hole_x, ear_hole_x])
            translate([x_position, 0, -servo_cradle_floor_thickness - 1])
                cylinder(d = servo_mount_hole_diameter, h = servo_cradle_floor_thickness + 2, $fn = 32);

        // Three clearance holes sit in the inner bracket where shown in the concept sketch.
        for (x_position = servo_inner_bracket_hole_positions)
            translate([x_position, 0, -servo_cradle_floor_thickness - 1])
                cylinder(
                    d = servo_inner_bracket_hole_diameter,
                    h = servo_cradle_floor_thickness + 2,
                    $fn = 32
                );
    }
}

module printed_skeleton() {
    difference() {
        union() {
            center_body();
            arm_with_pad(center_width / 2 - 3, center_height / 2 - 17, arm_angle);
            arm_with_pad(-center_width / 2 + 3, center_height / 2 - 17, 180 - arm_angle);
            arm_with_pad(center_width / 2 - 3, -center_height / 2 + 17, -arm_angle);
            arm_with_pad(-center_width / 2 + 3, -center_height / 2 + 17, arm_angle - 180);
            holder_on_arm(center_width / 2 - 3, center_height / 2 - 17, arm_angle);
            holder_on_arm(-center_width / 2 + 3, center_height / 2 - 17, 180 - arm_angle);
            holder_on_arm(center_width / 2 - 3, -center_height / 2 + 17, -arm_angle);
            holder_on_arm(-center_width / 2 + 3, -center_height / 2 + 17, arm_angle - 180);
            tof_sensor_boom();
            // The floor overlaps the chassis by 2 mm, making the side cradle one printed part.
            translate([servo_cradle_center_x, 0, servo_cradle_mount_z])
                servo_cradle();
        }

        holder_slots_on_arm(center_width / 2 - 3, center_height / 2 - 17, arm_angle);
        holder_slots_on_arm(-center_width / 2 + 3, center_height / 2 - 17, 180 - arm_angle);
        holder_slots_on_arm(center_width / 2 - 3, -center_height / 2 + 17, -arm_angle);
        holder_slots_on_arm(-center_width / 2 + 3, -center_height / 2 + 17, arm_angle - 180);
    }
}

module compound_motor_reference() {
    // Motor can, gearbox, and output shaft are separate volumes for mount design.
    color("silver")
        translate([0, -motor_width / 2, -motor_thickness / 2])
            cube([motor_can_length, motor_width, motor_thickness]);

    color("goldenrod")
        translate([motor_can_length, -motor_width / 2, -motor_thickness / 2])
            cube([gearbox_length, motor_width, motor_thickness]);

    color("dimgray")
        translate([motor_can_length + gearbox_length, 0, 0])
            rotate([0, 90, 0])
                cylinder(d = output_shaft_diameter, h = output_shaft_length);
}

module mg90s_reference() {
    // Approximate orientation inside the side-mounted underside cradle.
    color("royalblue")
        translate([
            servo_cradle_center_x - servo_body_length / 2,
            -servo_body_width / 2,
            servo_cradle_mount_z - servo_body_height
        ])
            cube([servo_body_length, servo_body_width, servo_body_height]);

    color("dimgray")
        translate([
            servo_cradle_center_x + servo_spline_x_offset,
            0,
            servo_cradle_mount_z - servo_body_height - servo_spline_projection
        ])
            cylinder(d = servo_spline_diameter, h = servo_spline_projection, $fn = 48);
}

if (view_mode == "motor_reference")
    compound_motor_reference();
else if (view_mode == "servo_reference") {
    color("orange")
        printed_skeleton();
    mg90s_reference();
} else
    color("orange")
        printed_skeleton();
